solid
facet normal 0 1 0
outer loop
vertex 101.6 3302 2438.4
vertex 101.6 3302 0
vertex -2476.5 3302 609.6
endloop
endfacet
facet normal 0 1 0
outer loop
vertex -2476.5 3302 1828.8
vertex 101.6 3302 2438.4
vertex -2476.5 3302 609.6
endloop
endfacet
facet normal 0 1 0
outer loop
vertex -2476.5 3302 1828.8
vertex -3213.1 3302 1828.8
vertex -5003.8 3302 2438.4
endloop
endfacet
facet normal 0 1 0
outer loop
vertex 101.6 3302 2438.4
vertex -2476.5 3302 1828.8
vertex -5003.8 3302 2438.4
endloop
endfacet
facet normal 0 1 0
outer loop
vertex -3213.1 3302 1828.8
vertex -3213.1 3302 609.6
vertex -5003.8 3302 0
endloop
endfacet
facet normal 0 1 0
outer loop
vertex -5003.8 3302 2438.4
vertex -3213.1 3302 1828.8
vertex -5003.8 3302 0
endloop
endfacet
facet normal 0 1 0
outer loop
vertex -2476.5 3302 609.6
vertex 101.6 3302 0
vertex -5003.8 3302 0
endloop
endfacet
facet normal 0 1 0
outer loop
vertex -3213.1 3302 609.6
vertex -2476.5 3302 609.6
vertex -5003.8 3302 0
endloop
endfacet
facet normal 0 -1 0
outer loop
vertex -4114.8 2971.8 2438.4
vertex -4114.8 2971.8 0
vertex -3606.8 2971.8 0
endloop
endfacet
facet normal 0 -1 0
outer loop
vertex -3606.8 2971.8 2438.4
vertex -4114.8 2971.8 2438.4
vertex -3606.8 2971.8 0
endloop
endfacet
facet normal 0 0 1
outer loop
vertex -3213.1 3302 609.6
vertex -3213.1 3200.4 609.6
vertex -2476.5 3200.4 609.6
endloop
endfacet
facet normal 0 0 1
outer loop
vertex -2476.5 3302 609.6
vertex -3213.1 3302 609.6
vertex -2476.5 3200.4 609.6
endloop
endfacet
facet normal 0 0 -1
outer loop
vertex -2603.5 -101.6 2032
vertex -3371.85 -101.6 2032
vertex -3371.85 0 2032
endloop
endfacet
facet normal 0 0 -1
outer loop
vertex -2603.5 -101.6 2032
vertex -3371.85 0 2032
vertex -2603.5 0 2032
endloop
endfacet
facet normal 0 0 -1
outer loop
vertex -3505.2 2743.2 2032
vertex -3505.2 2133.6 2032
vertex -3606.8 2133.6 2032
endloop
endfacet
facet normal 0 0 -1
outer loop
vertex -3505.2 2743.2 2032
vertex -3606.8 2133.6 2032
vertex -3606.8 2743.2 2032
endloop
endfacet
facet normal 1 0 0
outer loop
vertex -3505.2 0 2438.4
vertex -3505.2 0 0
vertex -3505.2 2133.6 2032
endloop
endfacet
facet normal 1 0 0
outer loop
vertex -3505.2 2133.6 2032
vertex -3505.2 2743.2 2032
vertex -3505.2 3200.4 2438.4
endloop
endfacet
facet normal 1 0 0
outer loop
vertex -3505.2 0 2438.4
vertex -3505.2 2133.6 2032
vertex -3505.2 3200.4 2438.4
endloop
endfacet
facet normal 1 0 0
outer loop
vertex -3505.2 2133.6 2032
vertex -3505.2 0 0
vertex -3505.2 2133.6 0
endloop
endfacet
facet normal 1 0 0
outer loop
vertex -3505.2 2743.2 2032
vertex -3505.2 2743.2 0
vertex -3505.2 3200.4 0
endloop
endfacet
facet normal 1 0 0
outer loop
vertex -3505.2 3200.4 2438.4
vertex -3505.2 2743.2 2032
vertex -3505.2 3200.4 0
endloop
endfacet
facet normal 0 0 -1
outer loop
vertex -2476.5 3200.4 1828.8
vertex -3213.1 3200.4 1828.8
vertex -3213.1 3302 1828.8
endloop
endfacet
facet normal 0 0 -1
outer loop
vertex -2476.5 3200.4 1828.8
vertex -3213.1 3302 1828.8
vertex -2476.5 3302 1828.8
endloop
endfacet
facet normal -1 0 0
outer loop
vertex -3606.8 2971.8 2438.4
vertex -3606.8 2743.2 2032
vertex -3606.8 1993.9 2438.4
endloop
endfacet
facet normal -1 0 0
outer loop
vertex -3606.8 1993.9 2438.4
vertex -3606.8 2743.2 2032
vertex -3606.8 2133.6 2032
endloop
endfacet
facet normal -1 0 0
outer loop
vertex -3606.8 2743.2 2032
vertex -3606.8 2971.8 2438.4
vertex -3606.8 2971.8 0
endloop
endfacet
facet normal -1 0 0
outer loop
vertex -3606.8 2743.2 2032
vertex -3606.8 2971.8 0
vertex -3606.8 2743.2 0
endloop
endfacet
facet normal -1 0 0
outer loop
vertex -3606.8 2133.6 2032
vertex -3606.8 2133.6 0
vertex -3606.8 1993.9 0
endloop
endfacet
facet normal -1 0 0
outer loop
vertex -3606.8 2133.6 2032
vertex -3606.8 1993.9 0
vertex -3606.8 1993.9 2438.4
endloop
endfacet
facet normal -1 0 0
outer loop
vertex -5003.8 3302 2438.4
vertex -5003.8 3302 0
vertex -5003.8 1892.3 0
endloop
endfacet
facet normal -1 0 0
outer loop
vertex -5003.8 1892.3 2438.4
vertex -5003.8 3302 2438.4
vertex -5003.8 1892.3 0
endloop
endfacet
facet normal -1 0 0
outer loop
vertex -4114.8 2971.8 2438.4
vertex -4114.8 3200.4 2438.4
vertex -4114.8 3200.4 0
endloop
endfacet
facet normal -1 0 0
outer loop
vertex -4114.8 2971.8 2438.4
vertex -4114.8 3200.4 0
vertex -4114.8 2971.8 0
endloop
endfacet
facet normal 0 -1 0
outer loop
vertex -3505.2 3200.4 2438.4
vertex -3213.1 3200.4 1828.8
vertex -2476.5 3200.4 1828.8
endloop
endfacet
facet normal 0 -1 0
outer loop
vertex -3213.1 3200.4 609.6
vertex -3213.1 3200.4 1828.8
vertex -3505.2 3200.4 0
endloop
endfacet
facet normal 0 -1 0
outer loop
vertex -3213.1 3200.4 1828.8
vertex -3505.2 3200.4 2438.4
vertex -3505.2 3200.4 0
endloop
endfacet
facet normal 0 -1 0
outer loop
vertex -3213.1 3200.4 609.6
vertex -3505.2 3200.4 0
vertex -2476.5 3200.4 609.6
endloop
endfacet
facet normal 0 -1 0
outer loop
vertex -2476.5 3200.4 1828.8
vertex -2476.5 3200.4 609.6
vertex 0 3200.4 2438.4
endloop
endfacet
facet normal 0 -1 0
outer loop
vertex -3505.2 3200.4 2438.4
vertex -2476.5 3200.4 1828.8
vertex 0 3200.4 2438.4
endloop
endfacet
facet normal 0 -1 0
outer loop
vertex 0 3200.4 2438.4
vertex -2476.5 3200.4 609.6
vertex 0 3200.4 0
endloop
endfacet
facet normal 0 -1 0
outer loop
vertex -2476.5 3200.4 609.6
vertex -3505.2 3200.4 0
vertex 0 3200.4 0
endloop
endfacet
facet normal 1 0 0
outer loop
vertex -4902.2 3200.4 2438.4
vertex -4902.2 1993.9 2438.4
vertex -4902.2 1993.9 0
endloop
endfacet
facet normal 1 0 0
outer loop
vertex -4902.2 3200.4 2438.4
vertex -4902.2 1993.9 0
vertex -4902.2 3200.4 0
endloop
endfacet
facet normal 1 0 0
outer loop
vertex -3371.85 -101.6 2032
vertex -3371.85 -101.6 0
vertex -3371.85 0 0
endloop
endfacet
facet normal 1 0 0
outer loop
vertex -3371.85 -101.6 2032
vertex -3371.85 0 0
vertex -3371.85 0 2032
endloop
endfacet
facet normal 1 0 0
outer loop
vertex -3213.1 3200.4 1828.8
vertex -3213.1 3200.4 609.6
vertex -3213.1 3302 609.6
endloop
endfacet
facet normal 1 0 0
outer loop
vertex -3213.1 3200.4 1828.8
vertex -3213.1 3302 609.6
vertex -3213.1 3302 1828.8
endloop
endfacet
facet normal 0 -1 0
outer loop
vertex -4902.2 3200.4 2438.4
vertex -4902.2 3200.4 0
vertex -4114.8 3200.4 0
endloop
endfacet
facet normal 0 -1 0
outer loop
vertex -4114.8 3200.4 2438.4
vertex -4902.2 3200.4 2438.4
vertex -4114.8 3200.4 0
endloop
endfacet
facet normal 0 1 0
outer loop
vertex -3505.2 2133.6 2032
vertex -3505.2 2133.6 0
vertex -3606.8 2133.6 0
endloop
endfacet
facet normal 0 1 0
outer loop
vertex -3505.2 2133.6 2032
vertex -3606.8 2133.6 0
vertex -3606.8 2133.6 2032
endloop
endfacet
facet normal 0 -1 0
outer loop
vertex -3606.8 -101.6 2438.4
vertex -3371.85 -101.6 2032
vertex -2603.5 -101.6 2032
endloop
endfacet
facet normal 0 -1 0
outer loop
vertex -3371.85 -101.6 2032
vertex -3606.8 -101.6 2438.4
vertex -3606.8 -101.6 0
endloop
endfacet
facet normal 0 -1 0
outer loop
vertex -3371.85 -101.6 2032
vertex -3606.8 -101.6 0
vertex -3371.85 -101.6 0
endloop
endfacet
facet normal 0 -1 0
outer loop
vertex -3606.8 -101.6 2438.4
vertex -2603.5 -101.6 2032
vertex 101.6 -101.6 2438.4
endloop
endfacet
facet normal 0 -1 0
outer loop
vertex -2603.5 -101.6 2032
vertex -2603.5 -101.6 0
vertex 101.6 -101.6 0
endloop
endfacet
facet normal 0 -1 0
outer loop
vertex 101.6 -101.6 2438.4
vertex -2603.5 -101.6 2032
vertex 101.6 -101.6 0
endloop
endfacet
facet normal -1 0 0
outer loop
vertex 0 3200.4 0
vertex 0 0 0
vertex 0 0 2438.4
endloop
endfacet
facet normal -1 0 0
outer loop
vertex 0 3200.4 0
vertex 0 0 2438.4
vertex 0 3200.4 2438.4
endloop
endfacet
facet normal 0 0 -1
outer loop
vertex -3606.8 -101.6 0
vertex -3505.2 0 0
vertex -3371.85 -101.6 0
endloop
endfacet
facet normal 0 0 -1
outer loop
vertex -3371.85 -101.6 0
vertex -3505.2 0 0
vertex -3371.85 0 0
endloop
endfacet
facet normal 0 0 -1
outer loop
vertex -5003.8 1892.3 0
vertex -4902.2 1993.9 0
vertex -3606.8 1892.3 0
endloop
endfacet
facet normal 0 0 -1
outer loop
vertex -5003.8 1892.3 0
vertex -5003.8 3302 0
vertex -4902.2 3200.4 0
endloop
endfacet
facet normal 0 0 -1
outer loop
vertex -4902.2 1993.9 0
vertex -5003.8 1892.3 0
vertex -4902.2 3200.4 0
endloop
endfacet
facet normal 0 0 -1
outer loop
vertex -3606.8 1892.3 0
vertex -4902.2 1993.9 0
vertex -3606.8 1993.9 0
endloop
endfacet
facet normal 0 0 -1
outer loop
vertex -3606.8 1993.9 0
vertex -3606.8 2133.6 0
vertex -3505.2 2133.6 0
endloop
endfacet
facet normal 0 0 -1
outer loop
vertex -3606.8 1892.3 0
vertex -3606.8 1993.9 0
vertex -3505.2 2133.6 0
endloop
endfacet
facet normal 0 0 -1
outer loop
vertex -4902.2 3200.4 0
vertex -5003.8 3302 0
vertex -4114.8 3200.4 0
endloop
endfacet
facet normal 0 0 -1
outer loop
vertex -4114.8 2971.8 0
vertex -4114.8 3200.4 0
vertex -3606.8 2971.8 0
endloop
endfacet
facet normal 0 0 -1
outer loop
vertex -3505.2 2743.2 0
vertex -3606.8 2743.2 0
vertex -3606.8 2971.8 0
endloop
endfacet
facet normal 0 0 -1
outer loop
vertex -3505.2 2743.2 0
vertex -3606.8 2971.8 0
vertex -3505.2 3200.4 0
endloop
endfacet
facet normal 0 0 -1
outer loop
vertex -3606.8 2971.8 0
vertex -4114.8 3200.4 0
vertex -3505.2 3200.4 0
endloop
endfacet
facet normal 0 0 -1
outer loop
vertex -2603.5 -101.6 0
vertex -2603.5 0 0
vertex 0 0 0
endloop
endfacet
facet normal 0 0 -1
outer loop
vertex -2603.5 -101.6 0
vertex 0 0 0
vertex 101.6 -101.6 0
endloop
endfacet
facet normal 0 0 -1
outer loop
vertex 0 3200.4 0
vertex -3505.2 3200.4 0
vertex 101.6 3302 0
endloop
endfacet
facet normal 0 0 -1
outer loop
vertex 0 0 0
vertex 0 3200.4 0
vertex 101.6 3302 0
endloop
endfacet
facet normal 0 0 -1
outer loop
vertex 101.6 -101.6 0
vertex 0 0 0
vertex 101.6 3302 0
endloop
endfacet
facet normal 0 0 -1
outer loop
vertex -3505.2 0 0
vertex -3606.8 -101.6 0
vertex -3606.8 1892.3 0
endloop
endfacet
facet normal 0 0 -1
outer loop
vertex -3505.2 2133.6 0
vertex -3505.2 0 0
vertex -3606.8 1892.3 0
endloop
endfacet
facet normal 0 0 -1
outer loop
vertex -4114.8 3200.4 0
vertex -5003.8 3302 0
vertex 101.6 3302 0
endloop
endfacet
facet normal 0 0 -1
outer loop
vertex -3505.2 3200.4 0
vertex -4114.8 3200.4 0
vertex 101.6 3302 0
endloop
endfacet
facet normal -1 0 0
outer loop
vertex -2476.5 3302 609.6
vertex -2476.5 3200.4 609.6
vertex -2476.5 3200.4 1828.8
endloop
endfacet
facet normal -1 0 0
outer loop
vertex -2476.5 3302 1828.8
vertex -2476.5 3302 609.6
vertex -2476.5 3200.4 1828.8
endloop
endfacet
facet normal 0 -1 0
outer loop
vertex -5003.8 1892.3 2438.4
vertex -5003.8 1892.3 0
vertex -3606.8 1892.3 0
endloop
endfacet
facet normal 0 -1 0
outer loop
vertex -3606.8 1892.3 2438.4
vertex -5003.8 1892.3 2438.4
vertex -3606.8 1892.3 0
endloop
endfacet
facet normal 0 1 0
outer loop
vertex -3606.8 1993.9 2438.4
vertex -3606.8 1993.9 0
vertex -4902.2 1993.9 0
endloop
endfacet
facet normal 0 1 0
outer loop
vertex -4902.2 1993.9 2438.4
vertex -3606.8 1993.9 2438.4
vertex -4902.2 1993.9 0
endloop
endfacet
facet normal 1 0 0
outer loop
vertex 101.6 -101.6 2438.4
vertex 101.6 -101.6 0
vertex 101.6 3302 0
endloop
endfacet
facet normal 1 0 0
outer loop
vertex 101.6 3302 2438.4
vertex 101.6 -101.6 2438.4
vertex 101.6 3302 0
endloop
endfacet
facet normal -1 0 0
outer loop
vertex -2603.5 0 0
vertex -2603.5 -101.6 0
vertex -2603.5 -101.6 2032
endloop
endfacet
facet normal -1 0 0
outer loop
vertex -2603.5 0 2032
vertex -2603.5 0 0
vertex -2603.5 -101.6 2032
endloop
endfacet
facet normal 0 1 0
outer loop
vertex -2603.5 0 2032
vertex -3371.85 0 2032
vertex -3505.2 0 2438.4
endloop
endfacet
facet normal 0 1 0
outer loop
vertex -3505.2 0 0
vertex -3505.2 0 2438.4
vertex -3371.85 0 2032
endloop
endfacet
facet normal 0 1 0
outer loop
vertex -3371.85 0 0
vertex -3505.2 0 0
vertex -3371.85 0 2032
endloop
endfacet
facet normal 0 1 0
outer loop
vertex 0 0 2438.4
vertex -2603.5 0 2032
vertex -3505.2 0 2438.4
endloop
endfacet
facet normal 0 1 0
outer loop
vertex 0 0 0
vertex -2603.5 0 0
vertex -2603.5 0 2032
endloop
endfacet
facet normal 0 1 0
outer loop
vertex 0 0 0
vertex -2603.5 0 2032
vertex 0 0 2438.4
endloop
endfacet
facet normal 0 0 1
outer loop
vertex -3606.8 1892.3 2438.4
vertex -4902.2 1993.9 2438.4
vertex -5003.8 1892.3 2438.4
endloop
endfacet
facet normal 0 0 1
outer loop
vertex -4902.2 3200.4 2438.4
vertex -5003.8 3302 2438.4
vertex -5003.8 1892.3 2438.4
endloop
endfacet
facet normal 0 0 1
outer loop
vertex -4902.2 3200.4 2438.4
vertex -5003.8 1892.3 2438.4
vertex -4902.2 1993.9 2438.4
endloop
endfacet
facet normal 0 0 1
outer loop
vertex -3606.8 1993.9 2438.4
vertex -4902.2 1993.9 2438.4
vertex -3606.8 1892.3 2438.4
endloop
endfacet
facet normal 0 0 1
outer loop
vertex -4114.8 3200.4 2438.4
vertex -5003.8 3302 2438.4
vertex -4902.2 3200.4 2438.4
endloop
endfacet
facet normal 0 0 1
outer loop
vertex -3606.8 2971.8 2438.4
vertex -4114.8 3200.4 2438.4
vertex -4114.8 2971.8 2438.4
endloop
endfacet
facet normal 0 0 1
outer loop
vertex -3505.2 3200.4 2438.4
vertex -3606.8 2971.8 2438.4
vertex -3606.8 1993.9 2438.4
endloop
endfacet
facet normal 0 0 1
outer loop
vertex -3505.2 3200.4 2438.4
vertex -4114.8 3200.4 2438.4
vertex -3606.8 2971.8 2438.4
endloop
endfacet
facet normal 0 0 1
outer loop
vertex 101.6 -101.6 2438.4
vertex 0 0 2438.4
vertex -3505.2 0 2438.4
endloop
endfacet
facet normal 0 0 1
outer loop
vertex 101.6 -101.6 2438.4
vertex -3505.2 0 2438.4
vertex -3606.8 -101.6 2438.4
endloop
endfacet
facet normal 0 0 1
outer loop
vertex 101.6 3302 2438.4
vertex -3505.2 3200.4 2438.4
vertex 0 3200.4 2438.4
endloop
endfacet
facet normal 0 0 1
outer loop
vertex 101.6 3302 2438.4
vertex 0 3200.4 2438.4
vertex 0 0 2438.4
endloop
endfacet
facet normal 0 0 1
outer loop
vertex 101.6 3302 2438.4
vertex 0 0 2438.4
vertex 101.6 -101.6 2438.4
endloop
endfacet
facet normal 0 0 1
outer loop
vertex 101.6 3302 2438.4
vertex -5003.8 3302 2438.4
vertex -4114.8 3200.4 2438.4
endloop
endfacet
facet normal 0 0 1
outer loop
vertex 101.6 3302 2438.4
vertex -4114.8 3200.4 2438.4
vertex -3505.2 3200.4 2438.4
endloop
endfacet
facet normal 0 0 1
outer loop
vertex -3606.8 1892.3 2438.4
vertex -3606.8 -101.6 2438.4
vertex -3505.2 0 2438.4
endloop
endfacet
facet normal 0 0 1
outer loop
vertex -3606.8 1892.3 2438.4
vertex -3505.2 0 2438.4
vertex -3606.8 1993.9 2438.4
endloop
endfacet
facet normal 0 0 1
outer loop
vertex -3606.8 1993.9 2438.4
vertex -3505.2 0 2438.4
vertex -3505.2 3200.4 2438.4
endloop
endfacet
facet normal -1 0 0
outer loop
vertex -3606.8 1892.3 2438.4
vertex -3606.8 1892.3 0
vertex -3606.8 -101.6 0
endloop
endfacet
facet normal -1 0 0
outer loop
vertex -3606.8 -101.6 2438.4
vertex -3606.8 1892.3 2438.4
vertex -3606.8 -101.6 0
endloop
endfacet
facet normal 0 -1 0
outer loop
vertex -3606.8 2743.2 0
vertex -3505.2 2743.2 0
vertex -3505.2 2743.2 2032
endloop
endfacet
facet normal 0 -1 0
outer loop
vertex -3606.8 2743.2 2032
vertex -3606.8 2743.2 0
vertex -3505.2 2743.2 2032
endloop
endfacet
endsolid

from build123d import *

# Parameters (mm, degrees)
F0_W     = 3505.2
F0_H     = 3200.4
F1_DEPTH = 2438.4
F2_W     = 768.35
F2_H     = 2032
F3_DEPTH = 101.6
F4_W     = 736.6
F4_H     = 1219.2
F5_DEPTH = 101.6
F6_W     = 609.6
F6_H     = 2032
F7_DEPTH = 101.6


with BuildPart() as f1:
    # F0 (on Top) → F1 (new body)
    with BuildSketch(Plane.XY):
        Polygon((-3606.8, -101.6), (101.6, -101.6), (101.6, 3302), (-5003.8, 3302), (-5003.8, 1892.3), (-3606.8, 1892.3), align=None)
        Polygon((-4902.2, 1993.9), (-4902.2, 3200.4), (-4114.8, 3200.4), (-4114.8, 2971.8), (-3606.8, 2971.8), (-3606.8, 1993.9), align=None, mode=Mode.SUBTRACT)
        with Locations((-1752.6, 1600.2)):
            Rectangle(F0_W, F0_H, mode=Mode.SUBTRACT)
    extrude(amount=F1_DEPTH)

    # F2 (on face) → F3 (cut)
    with BuildSketch(Plane.XZ.offset(101.6)):
        with Locations((-2987.675, 1016)):
            Rectangle(F2_W, F2_H)
    extrude(amount=-F3_DEPTH, mode=Mode.SUBTRACT)

    # F4 (on face) → F5 (cut)
    with BuildSketch(Plane.XZ.offset(-3200.4)):
        with Locations((-2844.8, 1219.2)):
            Rectangle(F4_W, F4_H)
    extrude(amount=-F5_DEPTH, mode=Mode.SUBTRACT)

    # F6 (on face) → F7 (cut)
    with BuildSketch(Plane.YZ.offset(-3505.2)):
        with Locations((2438.4, 1016)):
            Rectangle(F6_W, F6_H)
    extrude(amount=-F7_DEPTH, mode=Mode.SUBTRACT)


solid = f1.part
